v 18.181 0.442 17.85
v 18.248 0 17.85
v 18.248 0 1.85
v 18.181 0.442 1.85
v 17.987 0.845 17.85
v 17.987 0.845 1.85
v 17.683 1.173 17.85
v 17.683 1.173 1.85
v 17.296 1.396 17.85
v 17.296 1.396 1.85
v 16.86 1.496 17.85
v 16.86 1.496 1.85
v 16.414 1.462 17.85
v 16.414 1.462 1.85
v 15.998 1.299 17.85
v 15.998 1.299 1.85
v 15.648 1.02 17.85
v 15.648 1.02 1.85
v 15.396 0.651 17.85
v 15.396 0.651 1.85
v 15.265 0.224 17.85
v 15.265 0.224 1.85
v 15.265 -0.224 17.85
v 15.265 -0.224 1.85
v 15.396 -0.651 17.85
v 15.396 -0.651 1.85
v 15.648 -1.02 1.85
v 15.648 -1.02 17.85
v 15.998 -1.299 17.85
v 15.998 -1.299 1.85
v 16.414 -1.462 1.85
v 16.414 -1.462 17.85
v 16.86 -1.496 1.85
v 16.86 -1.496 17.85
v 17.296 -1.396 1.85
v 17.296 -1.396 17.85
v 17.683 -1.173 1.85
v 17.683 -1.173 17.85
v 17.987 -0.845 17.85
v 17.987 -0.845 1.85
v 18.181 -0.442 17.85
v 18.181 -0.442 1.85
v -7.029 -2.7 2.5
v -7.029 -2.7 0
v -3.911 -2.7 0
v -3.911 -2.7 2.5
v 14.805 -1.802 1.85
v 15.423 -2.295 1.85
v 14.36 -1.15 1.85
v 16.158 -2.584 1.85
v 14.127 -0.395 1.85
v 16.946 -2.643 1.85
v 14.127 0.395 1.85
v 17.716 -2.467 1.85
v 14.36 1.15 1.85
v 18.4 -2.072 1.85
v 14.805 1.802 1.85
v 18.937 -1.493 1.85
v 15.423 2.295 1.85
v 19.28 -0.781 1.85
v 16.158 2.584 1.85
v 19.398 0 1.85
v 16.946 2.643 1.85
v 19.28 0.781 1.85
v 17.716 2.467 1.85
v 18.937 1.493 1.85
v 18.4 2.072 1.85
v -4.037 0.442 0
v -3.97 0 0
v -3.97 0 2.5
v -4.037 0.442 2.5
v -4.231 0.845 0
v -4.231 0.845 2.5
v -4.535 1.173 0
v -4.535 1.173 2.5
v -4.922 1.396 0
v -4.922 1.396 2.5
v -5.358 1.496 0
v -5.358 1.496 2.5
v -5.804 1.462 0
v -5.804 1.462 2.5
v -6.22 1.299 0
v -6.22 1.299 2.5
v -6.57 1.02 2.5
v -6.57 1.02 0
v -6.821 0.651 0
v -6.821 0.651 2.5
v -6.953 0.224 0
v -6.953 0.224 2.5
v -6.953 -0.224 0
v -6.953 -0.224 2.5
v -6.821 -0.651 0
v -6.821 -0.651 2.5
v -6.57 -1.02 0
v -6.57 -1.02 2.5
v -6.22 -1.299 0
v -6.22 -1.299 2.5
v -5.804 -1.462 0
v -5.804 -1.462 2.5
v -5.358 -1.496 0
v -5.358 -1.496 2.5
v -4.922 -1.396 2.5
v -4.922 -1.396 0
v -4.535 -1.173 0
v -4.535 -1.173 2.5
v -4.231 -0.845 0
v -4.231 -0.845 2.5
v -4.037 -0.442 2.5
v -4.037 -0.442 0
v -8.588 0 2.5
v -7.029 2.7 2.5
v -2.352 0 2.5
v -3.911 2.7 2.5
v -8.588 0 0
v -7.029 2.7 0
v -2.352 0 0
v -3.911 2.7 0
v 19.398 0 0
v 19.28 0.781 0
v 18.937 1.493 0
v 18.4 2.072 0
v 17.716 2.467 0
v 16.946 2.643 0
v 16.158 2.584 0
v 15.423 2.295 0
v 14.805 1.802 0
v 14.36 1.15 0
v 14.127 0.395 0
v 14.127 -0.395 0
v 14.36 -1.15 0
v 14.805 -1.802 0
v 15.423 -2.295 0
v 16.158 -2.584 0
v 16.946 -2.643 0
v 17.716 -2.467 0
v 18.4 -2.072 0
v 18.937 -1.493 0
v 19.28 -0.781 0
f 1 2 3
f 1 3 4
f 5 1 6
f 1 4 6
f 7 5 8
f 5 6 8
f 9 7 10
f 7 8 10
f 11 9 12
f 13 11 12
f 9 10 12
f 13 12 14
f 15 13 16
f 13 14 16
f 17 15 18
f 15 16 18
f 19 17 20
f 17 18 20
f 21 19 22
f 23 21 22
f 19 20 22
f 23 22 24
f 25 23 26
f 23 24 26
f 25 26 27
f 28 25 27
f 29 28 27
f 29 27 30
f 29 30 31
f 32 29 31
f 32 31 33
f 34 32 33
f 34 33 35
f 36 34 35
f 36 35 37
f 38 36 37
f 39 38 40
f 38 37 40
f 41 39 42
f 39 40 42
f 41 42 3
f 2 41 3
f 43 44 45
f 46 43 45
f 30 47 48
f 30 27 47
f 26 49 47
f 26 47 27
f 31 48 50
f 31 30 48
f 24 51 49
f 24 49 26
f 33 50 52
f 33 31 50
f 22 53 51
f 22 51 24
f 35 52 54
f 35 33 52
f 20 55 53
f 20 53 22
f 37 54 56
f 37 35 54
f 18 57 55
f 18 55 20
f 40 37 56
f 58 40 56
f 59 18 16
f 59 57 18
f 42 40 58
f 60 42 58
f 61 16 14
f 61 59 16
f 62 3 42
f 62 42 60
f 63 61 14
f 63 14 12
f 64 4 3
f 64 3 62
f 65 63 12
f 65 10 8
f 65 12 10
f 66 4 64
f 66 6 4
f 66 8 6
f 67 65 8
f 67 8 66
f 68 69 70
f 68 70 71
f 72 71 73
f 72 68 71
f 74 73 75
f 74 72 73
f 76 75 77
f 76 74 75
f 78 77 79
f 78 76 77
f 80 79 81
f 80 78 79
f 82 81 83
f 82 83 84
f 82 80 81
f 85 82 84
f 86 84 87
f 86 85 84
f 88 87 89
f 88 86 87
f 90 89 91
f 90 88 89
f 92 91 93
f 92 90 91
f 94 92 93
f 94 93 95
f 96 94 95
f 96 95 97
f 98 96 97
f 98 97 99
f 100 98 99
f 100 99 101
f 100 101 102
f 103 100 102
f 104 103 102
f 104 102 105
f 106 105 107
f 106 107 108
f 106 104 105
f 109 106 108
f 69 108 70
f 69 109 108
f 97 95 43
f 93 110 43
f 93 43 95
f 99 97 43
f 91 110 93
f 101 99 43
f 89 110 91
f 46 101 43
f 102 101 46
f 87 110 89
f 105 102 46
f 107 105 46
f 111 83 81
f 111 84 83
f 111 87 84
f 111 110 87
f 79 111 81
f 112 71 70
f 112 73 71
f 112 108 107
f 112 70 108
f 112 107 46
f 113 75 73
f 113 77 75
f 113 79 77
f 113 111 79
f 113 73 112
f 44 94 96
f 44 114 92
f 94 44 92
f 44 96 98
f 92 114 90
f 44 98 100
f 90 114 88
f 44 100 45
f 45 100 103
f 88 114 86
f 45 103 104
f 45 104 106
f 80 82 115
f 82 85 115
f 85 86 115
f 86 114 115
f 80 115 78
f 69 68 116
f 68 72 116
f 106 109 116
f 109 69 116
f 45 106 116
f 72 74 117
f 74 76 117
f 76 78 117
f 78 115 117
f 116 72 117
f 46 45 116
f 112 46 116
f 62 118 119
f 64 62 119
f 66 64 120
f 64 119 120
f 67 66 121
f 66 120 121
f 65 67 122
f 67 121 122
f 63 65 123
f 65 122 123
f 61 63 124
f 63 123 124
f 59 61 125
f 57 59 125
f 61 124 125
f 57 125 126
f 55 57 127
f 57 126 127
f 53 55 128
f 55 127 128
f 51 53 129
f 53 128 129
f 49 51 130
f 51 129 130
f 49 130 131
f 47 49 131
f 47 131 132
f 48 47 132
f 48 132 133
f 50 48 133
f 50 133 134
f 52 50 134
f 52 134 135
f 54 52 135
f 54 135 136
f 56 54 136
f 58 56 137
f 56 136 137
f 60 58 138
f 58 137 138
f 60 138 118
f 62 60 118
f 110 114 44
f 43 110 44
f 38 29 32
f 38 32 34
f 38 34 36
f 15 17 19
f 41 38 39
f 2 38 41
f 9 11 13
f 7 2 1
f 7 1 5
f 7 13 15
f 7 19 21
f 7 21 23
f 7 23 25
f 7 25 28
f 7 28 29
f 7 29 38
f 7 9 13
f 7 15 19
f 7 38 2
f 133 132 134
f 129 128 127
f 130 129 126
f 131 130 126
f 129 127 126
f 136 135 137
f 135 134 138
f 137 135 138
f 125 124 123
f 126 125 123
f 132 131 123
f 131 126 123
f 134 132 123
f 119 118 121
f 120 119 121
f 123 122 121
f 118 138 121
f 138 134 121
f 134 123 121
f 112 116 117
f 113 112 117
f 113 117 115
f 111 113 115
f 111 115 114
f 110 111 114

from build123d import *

# Parameters (mm, degrees)
F0_R     = 1.5
F1_DEPTH = 2.5
F2_R     = 2.65
F3_DEPTH = 1.85
F4_R     = 1.5
F5_DEPTH = 16


with BuildPart() as f1:
    # F0 (on Top) → F1 (new body)
    with BuildSketch(Plane.XY):
        Polygon((-3.911089, 2.7), (-7.02878, 2.7), (-8.587626, 0), (-7.02878, -2.7), (-3.911089, -2.7), (-2.352243, 0), align=None)
        with Locations((-5.469934, 0)):
            Circle(F0_R, mode=Mode.SUBTRACT)
    extrude(amount=F1_DEPTH)


with BuildPart() as f3:
    # F2 (on Top) → F3 (new body)
    with BuildSketch(Plane.XY):
        with Locations((16.747818, 0)):
            Circle(F2_R)
    extrude(amount=F3_DEPTH)

    # F4 (on face) → F5 (join)
    with BuildSketch(Plane.XY.offset(1.85)):
        with Locations((16.747818, 0)):
            Circle(F4_R)
    extrude(amount=F5_DEPTH)


solid = Compound([f1.part, f3.part])
